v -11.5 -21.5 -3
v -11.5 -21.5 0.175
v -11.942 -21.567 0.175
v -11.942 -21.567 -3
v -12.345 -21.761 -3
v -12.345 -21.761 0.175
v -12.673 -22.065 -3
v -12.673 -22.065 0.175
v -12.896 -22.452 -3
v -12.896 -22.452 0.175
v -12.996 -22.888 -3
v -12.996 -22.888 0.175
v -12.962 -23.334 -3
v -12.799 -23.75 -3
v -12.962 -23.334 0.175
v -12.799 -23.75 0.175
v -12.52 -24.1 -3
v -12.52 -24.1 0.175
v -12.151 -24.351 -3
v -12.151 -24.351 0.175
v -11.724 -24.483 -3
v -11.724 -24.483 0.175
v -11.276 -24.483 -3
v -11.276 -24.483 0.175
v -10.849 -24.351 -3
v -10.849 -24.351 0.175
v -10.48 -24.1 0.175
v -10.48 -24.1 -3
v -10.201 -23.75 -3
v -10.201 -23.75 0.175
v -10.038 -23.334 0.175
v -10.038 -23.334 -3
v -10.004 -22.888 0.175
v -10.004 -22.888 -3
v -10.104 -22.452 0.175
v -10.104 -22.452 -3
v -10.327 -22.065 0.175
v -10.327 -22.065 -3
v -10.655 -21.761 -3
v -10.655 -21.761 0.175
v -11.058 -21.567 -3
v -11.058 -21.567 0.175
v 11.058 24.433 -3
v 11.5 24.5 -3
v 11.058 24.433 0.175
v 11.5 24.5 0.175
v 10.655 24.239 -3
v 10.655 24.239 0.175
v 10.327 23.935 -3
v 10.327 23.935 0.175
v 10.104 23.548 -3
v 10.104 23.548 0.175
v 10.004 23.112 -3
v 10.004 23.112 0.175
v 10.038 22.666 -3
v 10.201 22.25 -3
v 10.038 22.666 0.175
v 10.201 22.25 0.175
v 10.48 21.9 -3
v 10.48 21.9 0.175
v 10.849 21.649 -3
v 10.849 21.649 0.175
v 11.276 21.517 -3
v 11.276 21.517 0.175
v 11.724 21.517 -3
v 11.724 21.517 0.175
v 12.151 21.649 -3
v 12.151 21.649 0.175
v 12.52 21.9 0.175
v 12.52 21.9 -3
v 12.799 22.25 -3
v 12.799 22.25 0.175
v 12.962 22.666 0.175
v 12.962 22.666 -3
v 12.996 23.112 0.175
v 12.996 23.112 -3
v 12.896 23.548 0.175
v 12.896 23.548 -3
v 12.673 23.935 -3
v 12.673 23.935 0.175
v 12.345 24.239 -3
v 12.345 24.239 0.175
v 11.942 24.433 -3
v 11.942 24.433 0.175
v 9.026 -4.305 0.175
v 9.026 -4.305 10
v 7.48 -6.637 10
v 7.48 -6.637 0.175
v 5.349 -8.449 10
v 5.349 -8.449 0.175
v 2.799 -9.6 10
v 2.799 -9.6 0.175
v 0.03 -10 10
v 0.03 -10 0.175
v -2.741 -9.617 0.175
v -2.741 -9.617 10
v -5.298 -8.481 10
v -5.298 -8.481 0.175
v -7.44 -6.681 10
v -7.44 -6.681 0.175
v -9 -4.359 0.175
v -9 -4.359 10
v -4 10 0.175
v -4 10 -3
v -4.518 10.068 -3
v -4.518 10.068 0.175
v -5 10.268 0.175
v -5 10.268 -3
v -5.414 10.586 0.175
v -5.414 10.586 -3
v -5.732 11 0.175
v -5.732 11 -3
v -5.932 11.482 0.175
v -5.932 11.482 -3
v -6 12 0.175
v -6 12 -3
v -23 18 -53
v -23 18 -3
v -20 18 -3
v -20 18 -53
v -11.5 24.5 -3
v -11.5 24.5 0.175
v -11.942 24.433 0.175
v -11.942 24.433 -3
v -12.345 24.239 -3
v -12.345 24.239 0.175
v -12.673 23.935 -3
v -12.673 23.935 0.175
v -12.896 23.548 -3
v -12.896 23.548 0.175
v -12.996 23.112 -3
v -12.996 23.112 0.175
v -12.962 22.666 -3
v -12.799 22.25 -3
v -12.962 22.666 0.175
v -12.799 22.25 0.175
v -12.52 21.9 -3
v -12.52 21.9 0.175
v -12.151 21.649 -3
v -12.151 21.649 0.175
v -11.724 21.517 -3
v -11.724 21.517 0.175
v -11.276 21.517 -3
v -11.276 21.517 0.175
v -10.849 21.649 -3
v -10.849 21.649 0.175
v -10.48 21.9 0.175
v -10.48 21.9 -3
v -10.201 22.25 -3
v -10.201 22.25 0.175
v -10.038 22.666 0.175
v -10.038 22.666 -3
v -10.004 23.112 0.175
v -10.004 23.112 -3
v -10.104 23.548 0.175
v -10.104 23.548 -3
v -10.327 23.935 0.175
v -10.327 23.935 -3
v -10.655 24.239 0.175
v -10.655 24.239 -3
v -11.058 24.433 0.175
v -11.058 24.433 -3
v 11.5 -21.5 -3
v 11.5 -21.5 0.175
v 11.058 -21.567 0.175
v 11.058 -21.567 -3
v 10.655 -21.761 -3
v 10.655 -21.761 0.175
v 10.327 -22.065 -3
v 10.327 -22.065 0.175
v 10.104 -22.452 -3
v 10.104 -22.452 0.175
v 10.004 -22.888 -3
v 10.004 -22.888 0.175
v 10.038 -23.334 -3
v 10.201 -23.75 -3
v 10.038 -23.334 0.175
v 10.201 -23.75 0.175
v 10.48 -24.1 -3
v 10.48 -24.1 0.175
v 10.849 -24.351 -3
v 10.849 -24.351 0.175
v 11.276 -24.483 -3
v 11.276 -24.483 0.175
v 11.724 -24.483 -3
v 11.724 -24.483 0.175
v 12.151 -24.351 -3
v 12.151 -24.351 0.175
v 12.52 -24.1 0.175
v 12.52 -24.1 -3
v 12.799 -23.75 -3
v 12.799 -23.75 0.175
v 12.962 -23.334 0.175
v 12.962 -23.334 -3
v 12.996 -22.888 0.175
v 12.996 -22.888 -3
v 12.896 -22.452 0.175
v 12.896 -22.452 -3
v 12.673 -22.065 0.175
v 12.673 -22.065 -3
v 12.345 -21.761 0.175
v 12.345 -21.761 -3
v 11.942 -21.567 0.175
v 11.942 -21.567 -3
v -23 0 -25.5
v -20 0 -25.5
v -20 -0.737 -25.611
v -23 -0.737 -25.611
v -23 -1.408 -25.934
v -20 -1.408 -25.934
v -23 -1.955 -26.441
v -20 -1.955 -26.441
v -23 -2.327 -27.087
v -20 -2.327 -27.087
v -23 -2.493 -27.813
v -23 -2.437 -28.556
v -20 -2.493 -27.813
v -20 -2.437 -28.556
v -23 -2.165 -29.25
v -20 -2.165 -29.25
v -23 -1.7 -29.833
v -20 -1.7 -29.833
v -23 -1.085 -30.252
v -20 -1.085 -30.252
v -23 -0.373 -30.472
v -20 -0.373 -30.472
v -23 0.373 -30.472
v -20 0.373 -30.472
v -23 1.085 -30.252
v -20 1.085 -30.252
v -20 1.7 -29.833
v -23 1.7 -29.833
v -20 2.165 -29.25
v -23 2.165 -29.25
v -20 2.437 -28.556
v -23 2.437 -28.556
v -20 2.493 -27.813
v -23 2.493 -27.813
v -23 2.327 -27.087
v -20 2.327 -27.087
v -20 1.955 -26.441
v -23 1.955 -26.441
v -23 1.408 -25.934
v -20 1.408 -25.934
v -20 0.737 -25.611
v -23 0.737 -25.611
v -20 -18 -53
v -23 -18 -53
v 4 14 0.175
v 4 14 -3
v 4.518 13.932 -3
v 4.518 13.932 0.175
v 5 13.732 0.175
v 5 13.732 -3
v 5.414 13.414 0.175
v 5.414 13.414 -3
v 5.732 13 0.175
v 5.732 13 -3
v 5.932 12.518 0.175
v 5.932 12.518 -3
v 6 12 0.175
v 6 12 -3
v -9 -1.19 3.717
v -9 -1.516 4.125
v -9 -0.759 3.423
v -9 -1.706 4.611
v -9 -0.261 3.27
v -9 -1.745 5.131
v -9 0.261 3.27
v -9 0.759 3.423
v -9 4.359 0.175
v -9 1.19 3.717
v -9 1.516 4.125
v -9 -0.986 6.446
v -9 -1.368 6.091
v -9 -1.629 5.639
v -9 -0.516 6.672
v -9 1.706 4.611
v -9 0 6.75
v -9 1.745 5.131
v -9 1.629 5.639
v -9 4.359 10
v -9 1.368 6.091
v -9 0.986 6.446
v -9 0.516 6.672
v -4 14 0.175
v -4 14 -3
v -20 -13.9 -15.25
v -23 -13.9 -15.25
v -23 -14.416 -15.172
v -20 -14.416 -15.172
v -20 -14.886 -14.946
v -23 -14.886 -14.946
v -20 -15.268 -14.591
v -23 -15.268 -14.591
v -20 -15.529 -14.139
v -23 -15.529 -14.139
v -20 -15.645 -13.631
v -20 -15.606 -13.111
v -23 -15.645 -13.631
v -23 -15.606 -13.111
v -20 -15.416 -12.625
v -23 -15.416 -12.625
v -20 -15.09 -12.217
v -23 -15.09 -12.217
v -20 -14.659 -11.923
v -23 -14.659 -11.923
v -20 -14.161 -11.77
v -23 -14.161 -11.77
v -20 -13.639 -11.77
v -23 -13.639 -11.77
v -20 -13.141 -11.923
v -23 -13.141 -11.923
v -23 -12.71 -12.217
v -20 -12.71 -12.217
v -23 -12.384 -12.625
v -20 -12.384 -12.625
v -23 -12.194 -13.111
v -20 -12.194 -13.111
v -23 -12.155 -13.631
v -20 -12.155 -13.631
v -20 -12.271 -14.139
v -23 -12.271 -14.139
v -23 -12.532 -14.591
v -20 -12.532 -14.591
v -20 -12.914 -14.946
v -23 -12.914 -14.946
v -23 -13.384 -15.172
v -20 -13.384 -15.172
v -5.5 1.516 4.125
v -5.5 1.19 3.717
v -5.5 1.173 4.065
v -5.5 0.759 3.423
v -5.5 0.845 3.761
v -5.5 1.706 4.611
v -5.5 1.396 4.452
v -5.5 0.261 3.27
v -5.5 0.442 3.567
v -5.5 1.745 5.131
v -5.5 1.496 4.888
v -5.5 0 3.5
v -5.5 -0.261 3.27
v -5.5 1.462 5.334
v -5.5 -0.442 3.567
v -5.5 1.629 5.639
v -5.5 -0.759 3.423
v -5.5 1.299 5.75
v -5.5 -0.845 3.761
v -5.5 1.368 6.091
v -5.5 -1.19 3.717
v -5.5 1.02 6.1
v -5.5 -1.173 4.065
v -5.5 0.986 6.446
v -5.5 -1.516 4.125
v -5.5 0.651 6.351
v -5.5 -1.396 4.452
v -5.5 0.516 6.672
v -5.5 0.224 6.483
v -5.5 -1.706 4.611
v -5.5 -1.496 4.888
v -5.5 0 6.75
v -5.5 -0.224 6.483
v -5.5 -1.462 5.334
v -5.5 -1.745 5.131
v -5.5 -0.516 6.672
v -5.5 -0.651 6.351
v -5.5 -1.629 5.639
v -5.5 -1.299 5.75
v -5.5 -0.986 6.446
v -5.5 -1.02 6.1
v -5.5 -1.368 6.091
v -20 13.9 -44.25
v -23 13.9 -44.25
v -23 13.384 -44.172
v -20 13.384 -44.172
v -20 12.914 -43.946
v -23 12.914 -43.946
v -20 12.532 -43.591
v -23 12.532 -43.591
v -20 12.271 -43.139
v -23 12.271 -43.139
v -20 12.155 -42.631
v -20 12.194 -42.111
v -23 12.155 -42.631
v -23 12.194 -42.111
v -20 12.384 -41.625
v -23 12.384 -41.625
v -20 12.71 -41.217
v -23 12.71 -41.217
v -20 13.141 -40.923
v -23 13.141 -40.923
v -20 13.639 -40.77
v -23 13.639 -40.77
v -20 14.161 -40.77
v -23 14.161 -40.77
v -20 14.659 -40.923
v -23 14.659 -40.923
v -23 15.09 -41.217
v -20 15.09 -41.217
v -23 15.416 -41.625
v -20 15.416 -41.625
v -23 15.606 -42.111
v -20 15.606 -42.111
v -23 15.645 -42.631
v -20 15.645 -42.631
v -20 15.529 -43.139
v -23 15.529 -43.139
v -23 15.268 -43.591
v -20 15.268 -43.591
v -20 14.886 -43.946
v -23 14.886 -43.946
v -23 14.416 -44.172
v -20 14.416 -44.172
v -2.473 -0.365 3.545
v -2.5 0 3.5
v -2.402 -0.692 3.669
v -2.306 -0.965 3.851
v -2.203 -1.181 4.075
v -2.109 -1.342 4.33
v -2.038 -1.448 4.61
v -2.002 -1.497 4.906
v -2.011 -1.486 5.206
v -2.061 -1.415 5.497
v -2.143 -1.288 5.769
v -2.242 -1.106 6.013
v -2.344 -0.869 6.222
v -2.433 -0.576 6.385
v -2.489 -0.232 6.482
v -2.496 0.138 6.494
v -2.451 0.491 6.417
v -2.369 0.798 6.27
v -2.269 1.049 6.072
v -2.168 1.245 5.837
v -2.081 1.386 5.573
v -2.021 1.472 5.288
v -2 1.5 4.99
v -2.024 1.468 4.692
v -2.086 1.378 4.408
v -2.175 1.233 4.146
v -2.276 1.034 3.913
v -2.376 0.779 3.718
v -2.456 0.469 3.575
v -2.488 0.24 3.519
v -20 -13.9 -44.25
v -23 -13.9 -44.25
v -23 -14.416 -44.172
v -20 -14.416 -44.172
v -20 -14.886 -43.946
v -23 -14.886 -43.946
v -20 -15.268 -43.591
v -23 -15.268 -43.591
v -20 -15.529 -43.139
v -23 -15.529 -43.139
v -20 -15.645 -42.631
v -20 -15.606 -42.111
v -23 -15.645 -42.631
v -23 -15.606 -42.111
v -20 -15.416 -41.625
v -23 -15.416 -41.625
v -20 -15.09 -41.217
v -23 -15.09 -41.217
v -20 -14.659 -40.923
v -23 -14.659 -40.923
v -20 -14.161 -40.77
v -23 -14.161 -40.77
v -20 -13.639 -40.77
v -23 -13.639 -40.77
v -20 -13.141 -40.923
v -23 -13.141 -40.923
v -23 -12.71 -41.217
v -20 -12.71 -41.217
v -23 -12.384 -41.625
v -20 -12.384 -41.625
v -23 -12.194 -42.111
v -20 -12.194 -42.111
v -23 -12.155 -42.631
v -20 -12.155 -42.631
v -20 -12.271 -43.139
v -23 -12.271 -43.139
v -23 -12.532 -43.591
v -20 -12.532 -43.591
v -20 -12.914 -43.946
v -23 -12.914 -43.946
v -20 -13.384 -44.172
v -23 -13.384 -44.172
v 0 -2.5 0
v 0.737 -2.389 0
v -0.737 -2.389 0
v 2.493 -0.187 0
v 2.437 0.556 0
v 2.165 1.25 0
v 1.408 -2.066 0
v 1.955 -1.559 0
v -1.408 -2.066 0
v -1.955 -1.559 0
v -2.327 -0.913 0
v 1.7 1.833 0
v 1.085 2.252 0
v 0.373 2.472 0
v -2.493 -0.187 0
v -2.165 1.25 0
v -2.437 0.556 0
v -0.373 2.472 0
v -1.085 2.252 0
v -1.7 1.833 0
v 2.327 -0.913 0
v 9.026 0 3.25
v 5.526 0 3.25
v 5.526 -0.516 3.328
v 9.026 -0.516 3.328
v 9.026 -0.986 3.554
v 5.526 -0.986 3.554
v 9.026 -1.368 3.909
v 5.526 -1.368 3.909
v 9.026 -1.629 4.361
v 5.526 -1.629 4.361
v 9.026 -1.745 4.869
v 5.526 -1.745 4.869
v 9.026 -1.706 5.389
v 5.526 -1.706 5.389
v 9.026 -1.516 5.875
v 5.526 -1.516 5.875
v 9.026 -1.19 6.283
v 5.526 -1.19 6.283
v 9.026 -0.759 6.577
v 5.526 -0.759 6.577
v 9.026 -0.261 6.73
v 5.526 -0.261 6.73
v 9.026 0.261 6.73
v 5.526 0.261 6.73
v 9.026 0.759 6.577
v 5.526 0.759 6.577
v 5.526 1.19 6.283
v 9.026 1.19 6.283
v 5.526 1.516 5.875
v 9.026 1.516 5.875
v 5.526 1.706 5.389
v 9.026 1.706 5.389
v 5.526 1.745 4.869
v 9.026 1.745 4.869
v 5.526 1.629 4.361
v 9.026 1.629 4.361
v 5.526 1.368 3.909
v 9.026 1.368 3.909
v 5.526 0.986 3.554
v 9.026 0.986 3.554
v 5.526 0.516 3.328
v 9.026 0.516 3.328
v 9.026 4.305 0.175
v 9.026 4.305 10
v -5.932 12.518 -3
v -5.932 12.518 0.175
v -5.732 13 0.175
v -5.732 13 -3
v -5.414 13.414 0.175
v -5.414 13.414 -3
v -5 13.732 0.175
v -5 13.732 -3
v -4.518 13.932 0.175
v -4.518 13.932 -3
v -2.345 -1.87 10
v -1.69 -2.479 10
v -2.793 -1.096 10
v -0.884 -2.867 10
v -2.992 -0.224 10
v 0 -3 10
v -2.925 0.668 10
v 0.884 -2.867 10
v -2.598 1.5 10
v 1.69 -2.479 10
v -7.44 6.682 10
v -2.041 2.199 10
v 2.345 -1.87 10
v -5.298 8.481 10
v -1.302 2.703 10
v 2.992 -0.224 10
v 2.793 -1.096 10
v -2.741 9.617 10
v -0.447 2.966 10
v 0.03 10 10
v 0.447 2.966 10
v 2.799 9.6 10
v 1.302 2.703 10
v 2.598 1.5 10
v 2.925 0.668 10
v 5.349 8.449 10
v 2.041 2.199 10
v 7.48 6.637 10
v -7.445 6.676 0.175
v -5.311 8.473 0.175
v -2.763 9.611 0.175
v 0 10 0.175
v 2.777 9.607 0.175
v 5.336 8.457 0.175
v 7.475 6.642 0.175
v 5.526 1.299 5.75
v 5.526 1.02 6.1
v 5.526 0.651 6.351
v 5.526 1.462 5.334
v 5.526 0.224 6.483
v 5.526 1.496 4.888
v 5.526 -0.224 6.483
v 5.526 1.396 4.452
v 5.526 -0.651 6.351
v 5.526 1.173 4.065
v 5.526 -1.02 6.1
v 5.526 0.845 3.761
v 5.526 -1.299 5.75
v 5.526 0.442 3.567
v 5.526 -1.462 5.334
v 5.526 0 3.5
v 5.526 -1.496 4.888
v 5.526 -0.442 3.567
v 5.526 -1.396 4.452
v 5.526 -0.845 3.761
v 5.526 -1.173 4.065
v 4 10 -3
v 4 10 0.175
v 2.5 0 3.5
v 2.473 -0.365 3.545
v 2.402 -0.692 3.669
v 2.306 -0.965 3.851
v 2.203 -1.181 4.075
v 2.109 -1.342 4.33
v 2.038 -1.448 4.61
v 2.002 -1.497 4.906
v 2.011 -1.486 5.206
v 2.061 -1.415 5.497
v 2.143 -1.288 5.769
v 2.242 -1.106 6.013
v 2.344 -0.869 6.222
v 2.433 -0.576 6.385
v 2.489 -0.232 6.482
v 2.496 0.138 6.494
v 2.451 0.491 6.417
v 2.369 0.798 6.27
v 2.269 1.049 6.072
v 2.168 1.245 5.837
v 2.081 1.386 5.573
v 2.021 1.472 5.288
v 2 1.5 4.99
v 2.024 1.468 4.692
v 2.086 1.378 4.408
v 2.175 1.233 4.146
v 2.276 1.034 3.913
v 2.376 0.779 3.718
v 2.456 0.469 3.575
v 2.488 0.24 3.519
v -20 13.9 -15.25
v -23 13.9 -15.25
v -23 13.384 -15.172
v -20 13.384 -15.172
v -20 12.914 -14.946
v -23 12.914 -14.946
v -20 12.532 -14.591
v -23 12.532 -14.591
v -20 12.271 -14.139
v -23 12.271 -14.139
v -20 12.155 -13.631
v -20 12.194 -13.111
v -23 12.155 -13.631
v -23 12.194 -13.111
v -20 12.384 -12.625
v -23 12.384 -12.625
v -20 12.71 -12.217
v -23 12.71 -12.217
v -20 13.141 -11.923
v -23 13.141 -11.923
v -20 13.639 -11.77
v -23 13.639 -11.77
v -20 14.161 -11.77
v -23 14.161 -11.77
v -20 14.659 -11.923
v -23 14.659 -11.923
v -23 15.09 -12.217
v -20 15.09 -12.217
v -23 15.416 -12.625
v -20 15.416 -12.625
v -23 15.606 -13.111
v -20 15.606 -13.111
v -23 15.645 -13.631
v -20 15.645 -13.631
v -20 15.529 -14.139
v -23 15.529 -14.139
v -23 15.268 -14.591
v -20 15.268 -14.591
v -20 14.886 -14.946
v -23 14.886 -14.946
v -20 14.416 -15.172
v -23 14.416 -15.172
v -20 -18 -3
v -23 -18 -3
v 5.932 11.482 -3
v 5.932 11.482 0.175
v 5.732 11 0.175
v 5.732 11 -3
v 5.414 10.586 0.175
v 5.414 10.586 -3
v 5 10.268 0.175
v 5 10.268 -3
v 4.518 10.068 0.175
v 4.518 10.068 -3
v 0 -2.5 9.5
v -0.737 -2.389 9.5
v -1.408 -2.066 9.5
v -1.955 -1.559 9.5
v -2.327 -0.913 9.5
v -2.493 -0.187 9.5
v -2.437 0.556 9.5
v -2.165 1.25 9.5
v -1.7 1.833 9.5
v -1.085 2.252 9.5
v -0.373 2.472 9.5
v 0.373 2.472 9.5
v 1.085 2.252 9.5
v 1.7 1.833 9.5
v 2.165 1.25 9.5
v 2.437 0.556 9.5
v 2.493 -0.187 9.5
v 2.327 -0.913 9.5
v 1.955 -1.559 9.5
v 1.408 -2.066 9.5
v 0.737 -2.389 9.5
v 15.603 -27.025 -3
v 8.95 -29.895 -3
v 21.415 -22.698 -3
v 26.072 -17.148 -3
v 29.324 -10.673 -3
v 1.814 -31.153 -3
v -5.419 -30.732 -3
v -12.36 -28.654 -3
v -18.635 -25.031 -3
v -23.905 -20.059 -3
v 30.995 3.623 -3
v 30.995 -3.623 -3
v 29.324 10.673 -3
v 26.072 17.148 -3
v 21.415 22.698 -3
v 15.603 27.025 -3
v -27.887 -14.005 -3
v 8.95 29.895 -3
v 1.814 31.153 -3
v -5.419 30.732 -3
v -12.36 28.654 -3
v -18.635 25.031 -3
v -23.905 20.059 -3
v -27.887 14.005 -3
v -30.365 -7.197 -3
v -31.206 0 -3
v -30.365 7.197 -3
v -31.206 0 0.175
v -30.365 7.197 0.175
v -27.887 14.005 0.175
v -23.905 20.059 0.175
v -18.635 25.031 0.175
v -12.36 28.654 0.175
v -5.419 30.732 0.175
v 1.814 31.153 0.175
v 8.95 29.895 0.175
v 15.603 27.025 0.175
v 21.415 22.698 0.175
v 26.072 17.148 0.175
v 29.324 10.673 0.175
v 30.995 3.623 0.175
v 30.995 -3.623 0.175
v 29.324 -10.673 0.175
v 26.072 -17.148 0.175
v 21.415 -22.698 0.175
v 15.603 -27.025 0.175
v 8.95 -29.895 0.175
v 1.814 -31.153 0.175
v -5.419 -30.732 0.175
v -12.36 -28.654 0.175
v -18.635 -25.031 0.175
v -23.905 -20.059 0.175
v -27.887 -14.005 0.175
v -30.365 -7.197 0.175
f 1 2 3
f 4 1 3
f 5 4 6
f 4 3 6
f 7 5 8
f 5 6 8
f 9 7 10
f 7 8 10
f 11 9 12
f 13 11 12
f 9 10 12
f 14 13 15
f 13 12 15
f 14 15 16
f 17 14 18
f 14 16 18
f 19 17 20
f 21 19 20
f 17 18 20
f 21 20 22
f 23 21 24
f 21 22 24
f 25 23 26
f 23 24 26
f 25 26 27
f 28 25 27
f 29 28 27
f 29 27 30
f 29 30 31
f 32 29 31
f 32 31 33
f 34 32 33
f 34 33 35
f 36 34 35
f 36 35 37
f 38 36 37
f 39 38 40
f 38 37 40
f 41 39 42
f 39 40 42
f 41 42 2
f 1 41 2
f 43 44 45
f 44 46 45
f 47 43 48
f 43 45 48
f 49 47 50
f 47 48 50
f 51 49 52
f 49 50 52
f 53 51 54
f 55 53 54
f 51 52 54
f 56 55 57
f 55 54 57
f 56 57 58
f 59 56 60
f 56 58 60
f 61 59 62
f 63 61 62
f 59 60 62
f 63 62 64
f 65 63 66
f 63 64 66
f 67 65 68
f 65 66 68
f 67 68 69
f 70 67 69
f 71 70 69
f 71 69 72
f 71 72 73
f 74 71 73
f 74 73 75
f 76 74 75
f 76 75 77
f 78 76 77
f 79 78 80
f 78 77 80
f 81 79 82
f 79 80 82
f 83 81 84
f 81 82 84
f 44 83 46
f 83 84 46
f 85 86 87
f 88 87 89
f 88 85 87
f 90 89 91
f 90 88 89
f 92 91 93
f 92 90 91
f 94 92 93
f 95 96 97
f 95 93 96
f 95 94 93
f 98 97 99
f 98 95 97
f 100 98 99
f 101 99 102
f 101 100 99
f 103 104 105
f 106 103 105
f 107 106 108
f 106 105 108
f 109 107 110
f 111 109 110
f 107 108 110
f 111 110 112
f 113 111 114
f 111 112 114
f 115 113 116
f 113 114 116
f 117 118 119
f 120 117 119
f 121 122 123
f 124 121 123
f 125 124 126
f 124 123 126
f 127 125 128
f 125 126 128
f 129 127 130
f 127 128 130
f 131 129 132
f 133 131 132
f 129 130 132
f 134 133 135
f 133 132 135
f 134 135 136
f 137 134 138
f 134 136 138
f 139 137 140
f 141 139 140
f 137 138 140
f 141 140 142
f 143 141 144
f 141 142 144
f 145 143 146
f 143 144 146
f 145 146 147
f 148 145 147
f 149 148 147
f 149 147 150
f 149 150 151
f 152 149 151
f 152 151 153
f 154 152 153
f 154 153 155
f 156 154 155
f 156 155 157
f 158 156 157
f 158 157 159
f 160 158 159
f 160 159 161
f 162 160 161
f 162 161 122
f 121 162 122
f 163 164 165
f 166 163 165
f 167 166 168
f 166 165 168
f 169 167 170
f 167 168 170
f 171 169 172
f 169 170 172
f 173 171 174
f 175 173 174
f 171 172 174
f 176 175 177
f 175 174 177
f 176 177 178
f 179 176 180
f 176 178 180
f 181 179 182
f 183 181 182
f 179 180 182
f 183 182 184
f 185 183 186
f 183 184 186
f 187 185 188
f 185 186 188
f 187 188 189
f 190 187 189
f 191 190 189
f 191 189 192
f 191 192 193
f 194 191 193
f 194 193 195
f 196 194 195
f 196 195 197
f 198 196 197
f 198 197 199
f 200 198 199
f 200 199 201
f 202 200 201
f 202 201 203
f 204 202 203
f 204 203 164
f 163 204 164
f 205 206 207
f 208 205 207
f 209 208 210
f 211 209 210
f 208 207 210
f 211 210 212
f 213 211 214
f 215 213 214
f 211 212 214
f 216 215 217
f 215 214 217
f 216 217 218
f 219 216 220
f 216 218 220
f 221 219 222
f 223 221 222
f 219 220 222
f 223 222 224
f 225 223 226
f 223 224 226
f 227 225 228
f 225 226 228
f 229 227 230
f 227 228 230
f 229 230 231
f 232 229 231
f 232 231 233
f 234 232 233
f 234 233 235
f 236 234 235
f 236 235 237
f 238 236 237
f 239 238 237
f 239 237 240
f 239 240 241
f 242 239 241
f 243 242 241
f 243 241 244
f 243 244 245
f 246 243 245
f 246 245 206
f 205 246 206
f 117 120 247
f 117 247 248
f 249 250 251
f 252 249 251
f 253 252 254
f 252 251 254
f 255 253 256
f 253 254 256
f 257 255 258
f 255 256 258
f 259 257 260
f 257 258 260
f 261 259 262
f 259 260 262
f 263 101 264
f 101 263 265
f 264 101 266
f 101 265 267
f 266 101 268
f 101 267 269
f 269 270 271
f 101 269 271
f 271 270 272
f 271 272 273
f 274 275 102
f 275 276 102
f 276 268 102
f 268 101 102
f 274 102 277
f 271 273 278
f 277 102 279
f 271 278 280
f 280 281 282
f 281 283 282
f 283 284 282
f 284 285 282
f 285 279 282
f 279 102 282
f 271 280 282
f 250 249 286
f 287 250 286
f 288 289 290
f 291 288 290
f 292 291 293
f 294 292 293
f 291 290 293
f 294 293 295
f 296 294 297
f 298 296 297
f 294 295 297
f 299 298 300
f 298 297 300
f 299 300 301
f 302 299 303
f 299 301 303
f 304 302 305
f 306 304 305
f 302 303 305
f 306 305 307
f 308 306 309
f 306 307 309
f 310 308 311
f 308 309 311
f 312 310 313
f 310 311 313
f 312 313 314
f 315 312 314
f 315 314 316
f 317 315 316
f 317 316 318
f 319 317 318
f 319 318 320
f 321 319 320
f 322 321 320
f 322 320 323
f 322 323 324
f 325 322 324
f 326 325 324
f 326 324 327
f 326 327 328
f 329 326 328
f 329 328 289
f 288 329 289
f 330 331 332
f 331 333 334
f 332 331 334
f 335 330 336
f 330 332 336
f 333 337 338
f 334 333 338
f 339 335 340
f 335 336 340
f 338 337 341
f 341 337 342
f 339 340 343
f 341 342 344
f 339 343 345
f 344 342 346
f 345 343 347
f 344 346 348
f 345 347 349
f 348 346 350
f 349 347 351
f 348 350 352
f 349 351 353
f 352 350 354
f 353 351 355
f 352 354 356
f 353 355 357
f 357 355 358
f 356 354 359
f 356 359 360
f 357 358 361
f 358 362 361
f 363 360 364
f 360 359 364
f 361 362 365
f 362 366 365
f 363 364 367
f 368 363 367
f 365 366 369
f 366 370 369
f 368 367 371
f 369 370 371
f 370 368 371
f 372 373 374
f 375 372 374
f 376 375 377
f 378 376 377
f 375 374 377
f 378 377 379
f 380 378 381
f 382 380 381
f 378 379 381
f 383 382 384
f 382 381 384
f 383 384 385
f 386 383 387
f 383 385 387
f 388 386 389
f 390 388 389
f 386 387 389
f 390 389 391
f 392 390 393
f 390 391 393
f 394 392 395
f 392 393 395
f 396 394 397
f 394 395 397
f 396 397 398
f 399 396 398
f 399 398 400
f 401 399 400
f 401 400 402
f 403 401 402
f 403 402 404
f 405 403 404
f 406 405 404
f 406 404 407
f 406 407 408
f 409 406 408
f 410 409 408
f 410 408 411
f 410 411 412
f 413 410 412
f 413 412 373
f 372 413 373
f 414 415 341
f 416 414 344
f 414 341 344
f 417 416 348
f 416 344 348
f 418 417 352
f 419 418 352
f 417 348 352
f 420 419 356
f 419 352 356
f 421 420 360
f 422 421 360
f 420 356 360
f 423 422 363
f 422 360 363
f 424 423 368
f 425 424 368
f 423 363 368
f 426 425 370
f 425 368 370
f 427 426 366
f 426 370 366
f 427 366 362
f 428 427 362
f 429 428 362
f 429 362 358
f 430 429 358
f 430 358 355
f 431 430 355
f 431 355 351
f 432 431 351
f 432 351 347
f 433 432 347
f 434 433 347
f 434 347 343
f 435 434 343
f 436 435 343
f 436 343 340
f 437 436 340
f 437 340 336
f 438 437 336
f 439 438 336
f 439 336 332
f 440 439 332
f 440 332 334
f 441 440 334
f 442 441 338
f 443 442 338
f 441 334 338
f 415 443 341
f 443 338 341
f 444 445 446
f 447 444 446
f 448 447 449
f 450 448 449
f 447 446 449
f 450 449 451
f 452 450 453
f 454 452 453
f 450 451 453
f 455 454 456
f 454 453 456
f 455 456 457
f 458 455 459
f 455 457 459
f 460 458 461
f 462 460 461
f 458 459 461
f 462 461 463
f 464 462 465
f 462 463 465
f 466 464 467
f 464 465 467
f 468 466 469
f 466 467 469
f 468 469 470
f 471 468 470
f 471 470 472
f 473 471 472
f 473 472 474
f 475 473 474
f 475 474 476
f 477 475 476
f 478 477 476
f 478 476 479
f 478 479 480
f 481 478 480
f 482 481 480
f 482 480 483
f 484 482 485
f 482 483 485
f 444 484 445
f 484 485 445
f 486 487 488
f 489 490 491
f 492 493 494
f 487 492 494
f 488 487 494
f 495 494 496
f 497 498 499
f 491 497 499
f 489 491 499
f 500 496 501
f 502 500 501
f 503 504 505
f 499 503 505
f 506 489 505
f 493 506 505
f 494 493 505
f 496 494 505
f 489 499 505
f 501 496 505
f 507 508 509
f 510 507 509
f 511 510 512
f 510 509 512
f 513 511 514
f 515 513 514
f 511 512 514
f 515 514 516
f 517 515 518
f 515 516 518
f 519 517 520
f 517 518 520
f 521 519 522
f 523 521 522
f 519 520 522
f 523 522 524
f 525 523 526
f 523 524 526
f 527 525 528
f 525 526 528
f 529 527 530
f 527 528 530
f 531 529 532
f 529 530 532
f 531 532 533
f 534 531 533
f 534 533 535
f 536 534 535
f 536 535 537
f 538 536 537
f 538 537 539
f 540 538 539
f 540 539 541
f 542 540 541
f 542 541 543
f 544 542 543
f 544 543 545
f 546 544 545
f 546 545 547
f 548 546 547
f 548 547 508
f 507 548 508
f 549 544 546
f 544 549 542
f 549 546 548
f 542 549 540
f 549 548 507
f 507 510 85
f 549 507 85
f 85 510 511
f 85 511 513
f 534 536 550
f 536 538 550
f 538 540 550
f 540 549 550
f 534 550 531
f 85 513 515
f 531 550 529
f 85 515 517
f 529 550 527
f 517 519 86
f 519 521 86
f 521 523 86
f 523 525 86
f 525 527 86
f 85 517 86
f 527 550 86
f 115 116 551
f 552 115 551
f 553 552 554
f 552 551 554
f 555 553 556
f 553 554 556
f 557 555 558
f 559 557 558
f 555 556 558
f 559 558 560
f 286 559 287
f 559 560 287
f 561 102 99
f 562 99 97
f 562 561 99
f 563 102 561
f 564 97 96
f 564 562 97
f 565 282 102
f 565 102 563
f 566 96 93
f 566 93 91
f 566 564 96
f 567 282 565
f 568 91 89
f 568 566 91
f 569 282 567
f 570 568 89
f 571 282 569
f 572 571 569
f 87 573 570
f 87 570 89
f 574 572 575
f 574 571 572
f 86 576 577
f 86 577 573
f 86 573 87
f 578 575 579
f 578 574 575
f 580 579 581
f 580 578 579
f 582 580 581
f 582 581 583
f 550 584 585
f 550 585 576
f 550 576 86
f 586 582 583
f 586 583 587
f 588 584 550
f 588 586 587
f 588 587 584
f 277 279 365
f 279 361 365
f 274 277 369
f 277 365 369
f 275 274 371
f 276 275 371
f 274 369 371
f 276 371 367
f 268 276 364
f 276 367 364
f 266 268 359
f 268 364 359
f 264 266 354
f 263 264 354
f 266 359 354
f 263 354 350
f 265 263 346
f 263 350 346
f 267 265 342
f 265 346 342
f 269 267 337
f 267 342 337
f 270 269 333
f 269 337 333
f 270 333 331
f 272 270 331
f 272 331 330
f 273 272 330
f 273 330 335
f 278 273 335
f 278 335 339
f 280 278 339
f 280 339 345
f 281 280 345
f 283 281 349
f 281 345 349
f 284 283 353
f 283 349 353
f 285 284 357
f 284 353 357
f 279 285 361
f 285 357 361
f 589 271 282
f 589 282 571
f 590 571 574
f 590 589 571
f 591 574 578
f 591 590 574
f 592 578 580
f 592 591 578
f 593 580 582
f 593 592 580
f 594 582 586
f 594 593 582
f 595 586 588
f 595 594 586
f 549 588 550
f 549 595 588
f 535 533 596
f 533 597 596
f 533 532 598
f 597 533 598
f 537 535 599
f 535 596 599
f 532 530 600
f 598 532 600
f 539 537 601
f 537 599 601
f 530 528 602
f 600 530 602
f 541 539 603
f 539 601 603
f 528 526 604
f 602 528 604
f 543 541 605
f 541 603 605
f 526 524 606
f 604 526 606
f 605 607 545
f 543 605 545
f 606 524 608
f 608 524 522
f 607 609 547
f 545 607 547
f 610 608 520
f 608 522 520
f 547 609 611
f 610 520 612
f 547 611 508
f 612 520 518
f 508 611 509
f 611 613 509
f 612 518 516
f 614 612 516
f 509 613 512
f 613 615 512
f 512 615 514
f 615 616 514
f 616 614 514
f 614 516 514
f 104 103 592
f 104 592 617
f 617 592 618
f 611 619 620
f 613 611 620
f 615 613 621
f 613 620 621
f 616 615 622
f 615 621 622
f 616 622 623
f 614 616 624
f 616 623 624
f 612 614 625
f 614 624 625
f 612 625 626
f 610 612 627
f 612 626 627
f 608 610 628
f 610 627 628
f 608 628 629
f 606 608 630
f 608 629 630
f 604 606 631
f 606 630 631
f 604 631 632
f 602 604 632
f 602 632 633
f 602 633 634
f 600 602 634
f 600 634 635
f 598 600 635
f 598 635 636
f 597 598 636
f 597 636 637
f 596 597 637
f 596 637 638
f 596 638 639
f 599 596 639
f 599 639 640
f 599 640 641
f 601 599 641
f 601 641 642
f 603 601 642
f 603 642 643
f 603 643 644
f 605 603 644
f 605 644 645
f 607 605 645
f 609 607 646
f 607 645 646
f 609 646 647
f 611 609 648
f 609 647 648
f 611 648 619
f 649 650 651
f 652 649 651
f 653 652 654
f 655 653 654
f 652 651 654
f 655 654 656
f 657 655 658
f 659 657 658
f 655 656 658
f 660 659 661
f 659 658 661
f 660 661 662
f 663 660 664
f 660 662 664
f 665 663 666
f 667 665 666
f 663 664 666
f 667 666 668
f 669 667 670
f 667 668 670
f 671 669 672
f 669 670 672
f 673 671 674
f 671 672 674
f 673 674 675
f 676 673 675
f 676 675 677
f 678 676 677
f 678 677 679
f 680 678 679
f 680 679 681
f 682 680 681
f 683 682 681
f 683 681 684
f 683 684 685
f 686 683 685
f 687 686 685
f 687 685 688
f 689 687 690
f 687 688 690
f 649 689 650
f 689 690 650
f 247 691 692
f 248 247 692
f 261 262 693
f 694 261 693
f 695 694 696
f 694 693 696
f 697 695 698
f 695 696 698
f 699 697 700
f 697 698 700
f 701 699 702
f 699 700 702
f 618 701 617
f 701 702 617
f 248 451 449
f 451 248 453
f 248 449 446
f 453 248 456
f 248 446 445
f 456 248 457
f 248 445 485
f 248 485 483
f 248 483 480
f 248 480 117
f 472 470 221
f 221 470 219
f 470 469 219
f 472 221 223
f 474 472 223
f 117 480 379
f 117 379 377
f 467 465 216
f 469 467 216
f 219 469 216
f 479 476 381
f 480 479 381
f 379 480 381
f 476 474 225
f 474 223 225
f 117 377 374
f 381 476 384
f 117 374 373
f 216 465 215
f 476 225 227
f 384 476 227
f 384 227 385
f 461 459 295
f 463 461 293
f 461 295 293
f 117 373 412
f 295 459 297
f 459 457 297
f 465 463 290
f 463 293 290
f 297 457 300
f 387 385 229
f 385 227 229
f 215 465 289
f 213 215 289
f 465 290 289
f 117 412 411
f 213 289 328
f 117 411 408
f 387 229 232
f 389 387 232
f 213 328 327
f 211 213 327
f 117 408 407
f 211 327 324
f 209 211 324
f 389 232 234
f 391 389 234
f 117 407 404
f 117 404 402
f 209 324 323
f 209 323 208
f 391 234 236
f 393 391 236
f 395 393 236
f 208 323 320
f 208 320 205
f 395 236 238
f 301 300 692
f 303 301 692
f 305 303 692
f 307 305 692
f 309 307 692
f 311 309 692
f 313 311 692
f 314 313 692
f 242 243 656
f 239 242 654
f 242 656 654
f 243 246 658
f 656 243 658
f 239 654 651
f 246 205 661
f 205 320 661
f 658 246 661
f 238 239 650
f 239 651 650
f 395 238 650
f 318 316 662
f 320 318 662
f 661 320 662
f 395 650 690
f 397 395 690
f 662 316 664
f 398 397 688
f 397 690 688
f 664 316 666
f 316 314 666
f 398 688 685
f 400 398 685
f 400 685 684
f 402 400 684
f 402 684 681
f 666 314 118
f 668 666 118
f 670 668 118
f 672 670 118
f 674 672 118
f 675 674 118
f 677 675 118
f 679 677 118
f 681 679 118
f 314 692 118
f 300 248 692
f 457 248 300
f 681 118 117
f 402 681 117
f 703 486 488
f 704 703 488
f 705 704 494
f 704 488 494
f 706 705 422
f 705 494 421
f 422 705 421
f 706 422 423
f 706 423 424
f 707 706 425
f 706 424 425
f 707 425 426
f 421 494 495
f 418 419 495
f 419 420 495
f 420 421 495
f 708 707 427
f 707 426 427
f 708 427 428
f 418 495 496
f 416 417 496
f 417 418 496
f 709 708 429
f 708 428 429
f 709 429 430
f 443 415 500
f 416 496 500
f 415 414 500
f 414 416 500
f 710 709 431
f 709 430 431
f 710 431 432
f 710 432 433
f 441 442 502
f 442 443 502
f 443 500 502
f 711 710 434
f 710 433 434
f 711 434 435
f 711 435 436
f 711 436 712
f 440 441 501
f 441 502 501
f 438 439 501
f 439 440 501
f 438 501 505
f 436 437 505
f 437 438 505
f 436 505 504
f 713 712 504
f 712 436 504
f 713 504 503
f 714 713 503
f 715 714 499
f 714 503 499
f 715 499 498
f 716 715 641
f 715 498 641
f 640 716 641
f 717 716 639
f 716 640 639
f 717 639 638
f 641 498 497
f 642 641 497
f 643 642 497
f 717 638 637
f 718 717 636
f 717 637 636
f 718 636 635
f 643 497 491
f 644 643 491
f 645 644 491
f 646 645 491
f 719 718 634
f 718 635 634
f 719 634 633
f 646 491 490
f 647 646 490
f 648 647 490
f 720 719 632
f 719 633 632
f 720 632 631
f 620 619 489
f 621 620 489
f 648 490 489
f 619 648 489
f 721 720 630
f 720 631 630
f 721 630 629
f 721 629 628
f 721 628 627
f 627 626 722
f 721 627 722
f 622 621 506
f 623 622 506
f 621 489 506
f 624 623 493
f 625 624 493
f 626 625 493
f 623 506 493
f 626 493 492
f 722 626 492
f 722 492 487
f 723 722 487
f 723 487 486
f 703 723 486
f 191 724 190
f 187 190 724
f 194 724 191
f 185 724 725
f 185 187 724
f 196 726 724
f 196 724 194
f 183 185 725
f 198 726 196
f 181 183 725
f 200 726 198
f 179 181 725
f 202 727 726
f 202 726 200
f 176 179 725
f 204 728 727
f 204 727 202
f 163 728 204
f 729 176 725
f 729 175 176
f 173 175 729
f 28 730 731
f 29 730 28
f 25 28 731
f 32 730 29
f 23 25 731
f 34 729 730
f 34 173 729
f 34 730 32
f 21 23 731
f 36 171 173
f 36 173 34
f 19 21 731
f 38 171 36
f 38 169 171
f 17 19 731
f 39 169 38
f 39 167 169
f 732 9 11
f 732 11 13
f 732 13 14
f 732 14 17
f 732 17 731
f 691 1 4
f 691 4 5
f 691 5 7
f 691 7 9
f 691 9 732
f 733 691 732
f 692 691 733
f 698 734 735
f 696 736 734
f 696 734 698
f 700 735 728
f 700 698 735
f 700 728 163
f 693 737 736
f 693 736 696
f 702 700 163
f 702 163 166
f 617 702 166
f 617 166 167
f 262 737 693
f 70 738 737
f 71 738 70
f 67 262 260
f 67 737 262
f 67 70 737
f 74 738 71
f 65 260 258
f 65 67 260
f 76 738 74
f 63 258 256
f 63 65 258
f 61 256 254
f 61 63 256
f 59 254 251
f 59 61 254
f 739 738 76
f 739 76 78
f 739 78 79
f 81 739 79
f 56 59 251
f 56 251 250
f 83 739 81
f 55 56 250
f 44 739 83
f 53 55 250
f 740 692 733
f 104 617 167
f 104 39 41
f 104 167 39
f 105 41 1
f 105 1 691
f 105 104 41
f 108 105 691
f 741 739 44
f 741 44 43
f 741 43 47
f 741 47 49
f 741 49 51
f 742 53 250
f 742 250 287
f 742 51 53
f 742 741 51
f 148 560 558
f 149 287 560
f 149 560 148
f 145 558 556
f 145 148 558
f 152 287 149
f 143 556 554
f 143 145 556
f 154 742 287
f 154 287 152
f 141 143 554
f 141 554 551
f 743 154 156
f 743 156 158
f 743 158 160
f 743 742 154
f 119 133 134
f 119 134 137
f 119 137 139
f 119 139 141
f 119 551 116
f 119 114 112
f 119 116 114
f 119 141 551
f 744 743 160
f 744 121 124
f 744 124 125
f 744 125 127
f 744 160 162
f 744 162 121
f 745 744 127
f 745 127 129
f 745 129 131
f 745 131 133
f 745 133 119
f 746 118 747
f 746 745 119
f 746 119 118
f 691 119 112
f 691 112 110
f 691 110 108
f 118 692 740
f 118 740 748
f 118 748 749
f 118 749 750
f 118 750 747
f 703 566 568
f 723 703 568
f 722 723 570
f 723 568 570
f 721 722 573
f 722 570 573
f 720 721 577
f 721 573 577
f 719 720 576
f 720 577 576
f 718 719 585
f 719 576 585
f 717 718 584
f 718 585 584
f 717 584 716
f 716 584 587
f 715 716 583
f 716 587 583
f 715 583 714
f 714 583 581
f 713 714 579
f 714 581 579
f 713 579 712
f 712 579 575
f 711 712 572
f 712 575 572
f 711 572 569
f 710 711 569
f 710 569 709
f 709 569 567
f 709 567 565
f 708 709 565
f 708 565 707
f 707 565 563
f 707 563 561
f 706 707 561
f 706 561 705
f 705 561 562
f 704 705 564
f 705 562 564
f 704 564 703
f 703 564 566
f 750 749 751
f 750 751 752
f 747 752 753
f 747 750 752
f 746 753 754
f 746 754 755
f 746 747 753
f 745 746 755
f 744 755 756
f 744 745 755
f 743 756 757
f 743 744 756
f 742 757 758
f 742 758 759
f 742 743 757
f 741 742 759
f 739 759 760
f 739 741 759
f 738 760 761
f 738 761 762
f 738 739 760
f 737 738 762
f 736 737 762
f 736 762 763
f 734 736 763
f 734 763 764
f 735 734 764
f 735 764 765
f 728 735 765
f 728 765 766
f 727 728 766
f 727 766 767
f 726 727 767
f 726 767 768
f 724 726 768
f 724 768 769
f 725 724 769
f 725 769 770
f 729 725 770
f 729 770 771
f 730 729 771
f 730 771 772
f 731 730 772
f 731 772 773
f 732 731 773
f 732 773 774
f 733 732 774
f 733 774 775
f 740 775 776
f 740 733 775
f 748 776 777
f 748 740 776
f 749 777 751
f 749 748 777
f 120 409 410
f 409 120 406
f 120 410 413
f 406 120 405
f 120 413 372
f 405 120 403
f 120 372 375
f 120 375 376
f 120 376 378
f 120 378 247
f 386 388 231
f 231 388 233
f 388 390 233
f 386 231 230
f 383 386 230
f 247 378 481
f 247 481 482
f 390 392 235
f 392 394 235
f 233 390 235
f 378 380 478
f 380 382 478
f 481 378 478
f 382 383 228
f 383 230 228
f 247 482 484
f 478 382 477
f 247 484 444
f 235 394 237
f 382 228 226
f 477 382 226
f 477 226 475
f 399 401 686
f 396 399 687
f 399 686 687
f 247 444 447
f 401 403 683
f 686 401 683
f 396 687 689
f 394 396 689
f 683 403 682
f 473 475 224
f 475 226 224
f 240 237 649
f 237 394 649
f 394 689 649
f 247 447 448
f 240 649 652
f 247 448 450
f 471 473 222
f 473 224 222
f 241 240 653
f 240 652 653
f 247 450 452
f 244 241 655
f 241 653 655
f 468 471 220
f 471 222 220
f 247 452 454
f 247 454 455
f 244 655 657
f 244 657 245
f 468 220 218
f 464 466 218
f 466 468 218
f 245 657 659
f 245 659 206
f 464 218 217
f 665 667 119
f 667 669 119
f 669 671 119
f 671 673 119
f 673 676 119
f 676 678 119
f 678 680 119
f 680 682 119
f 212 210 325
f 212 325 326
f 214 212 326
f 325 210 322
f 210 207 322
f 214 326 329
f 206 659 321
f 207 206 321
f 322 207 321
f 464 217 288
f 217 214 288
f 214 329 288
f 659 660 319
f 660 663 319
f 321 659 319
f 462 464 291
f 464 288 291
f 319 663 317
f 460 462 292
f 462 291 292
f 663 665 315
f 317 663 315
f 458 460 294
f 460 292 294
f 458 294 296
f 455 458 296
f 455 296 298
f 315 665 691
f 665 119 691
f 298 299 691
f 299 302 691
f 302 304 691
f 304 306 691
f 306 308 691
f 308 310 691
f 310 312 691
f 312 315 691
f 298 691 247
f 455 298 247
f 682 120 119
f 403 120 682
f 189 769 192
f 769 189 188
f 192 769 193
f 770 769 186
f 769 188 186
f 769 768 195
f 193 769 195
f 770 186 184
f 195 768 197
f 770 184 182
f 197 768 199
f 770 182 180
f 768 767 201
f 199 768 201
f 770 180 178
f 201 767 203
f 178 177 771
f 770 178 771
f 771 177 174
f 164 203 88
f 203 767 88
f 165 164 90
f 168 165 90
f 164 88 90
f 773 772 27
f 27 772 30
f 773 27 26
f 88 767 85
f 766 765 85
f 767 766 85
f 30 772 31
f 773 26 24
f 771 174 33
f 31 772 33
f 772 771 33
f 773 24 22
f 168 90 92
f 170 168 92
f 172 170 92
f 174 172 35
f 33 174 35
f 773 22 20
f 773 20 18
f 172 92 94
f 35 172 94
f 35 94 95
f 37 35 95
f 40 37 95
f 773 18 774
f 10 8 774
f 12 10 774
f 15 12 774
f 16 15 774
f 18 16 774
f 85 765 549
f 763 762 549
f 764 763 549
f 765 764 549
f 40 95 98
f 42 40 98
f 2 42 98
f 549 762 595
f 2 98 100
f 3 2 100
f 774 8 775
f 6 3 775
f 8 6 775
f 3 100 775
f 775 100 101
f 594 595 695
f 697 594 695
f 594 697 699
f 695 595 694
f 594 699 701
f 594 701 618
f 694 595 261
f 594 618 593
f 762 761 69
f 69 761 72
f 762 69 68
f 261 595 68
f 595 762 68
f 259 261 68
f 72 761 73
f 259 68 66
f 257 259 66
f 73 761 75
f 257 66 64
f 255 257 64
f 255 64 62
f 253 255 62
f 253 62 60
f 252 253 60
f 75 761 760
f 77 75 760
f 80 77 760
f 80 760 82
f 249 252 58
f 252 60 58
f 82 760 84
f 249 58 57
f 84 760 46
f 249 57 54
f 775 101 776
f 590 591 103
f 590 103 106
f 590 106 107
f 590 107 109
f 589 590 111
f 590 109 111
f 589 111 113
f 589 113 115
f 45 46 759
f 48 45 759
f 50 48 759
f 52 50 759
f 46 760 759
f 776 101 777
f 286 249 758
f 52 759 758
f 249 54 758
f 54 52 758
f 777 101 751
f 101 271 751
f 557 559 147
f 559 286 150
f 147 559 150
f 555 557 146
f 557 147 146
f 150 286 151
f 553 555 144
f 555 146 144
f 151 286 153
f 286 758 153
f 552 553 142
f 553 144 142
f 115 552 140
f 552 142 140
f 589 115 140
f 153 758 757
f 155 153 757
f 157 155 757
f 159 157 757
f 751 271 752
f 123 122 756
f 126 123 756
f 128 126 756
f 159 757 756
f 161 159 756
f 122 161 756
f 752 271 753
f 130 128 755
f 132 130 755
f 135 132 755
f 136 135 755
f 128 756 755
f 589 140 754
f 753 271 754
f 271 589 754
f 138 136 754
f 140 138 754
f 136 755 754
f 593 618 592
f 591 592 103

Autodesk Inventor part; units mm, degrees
ref_plane "YZ Plane" through (0, 0, 0) normal (1, 0, 0) x (0, 1, 0)
ref_plane "XZ Plane" through (0, 0, 0) normal (0, 1, 0) x (-1, 0, 0)
ref_plane "XY Plane" through (0, 0, 0) normal (0, 0, 1) x (1, 0, 0)
sketch "Sketch1" plane through (0, 0, 0) normal (0, 0, 1) x (1, 0, 0)
  circle A0 centre (0, 0) radius 10
  dimension "d0" = 20
extrude "Extrusion1" add sketch "Sketch1" along normal blind 10
sketch "Sketch2" plane through (0, 0, 10) normal (0, 0, 1) x (1, 0, 0)
  point P0 (0, 0)
  point P1 (0, 0)
hole "Hole1" at (0, 0, 10) direction (0, 0, -1) diameter 5 end through all
chamfer "Chamfer1" distance 0.5 angle 45 1 edges at (0, 2.5, 10)
sketch "Sketch3" plane through (0, 0, 10) normal (0, 0, 1) x (1, 0, 0)
  circle A0 centre (0, 0) radius 10 projected
  line L0 (-10, 0) -> (-9, 0)
  line L1 (-9, 0) -> (-9, 4.3589)
  line L2 (-9, 4.3589) -> (-10, 4.3589)
  line L3 (-10, 4.3589) -> (-10, 0)
  line L4 (-10, 0) -> (-9, 0)
  line L5 (-9, 0) -> (-9, -4.4002)
  line L6 (-9, -4.4002) -> (-10, -4.4002)
  line L7 (-10, -4.4002) -> (-10, 0)
  line L8 (10.026, 0) -> (9.026, 0)
  line L9 (9.026, 0) -> (9.026, 4.3589)
  line L10 (9.026, 4.3589) -> (10.026, 4.3589)
  line L11 (10.026, 4.3589) -> (10.026, 0)
  line L12 (10.026, 0) -> (9.026, 0)
  line L13 (9.026, 0) -> (9.026, -4.4002)
  line L14 (9.026, -4.4002) -> (10.026, -4.4002)
  line L15 (10.026, -4.4002) -> (10.026, 0)
  dimension "d13" = 1
  dimension "d14" = 1
  dimension "d15" = 1
extrude "Extrusion2" cut sketch "Sketch3" against normal blind 10 contours L1 L0 A0 | L0 L5 A0 | A0 L5 L6 L7 | L9 L10 L11 L8 A0 | A0 L8 L9 | L8 L15 L14 L13 A0 | A0 L13 L8
sketch "Sketch4" plane through (9.026, -4.3048, 10) normal (1, 0, 0) x (0, 0, -1)
  line L0 (10, 4.3048) -> (5, 4.3048)
  line L1 (0.5, 1.8048) -> (0.5, 6.8048) projected
  dimension "d18" = 5
hole "Hole2" at (9.026, 0, 5) direction (-1, 0, 0) diameter 3 end through all
sketch "Sketch5" plane through (9.026, -4.3048, 10) normal (1, 0, 0) x (0, 0, -1)
  circle A0 centre (5, 4.3048) radius 1.5 projected
  point P0 (10, 4.3048)
hole "Hole3" at (9.026, 0, 5) direction (-1, 0, 0) diameter 3.5 depth 3.5
sketch "Sketch6" plane through (-9, -4.3589, 10) normal (-1, 0, 0) x (0, 0, 1)
  circle A0 centre (-5, 4.3589) radius 1.5 projected
  point P0 (-10, 4.3589)
hole "Hole4" at (-9, 0, 5) direction (1, 0, 0) diameter 3.5 depth 3.5
sketch "Sketch7" plane through (0, 0, 0) normal (0, 0, -1) x (-1, 0, 0)
  line L0 (0, 0) -> (-9.026, 0)
  line L1 (-9.026, 0) -> (-9.026, 18)
  line L2 (-9.026, 18) -> (0, 18)
  line L3 (0, 18) -> (0, 0)
  line L4 (0, 0) -> (-9.026, 0)
  line L5 (-9.026, 0) -> (-9.026, -18)
  line L6 (-9.026, -18) -> (0, -18)
  line L7 (0, -18) -> (0, 0)
  line L8 (0, 18) -> (23, 18)
  line L9 (23, 18) -> (23, -18)
  line L10 (23, -18) -> (0, -18)
  line L11 (0, -18) -> (0, 18)
  dimension "d40" = 9.026
  dimension "d41" = 18
  dimension "d42" = 18
  dimension "d43" = 23
extrude "Extrusion3" add sketch "Sketch7" along normal blind 3
sketch "Sketch8" plane through (0, 0, -3) normal (0, 0, -1) x (-1, 0, 0)
  line L0 (23, 18) -> (-9.026, 18) projected
  line L1 (-9.026, -18) -> (23, -18) projected
  line L2 (23, 18) -> (20, 18)
  line L3 (20, 18) -> (20, -18)
  line L4 (20, -18) -> (23, -18)
  line L5 (23, -18) -> (23, 18)
  point P0 (0, 0)
  dimension "d46" = 3
extrude "Extrusion4" add sketch "Sketch8" along normal blind 50
sketch "Sketch9" plane through (-20, -18, -3) normal (1, 0, 0) x (0, 0, -1)
  line L0 (0, 0) -> (0, 36) projected
  line L1 (0, 36) -> (25, 36)
  line L2 (-3, 36) -> (50, 36) projected
  line L3 (25, 36) -> (25, 18)
  line L4 (-3, 0) -> (50, 0) projected
  line L5 (25, 18) -> (39.5, 18)
  line L6 (39.5, 18) -> (39.5, 31.9)
  line L7 (39.5, 31.9) -> (25, 31.9)
  line L8 (25, 31.9) -> (25, 18)
  line L9 (25, 18) -> (39.5, 18)
  line L10 (39.5, 18) -> (39.5, 4.1)
  line L11 (39.5, 4.1) -> (25, 4.1)
  line L12 (25, 4.1) -> (25, 18)
  line L13 (25, 18) -> (10.5, 18)
  line L14 (10.5, 18) -> (10.5, 31.9)
  line L15 (10.5, 31.9) -> (25, 31.9)
  line L16 (25, 31.9) -> (25, 18)
  line L17 (25, 18) -> (10.5, 18)
  line L18 (10.5, 18) -> (10.5, 4.1)
  line L19 (10.5, 4.1) -> (25, 4.1)
  line L20 (25, 4.1) -> (25, 18)
  point P0 (-3, 18)
  dimension "d49" = 25
  dimension "d50" = 18
  dimension "d51" = 14.5
  dimension "d52" = 13.9
  dimension "d53" = 13.9
  dimension "d54" = 14.5
hole "Hole5" at (-20, 13.9, -13.5) at (-20, 13.9, -42.5) at (-20, -13.9, -42.5) at (-20, -13.9, -13.5) direction (-1, 0, 0) diameter 3.5 end through all
sketch "Sketch10" plane through (0, 0, -3) normal (0, 0, -1) x (-1, 0, 0)
  line L0 (-9.026, -18) -> (23, -18) projected
  circle A0 centre (0, 0) radius 29.2062
  circle A1 centre (0, 0) radius 2.5 projected
  circle A2 centre (0, 0) radius 31.206
  dimension "d62" = 62.412
extrude "Extrusion5" add sketch "Sketch10" against normal blind 3.175 contours A0 | A2
sketch "Sketch11" plane through (0, 0, -3) normal (0, 0, -1) x (-1, 0, 0)
  line L0 (23, -18) -> (23, 18) projected
  circle A0 centre (0, 0) radius 29.2062
  line L1 (23, 18) -> (-23, 18)
  line L2 (-23, 18) -> (-23, -18)
  line L3 (-23, -18) -> (23, -18)
  line L4 (23, -18) -> (23, 18)
  circle A1 centre (0, 0) radius 2.5 projected
  line L5 (0, 0) -> (0, 23)
  line L6 (0, 23) -> (11.5, 23)
  line L7 (11.5, 23) -> (-11.5, 23)
  line L8 (-11.5, 23) -> (-11.5, -23)
  line L9 (-11.5, -23) -> (11.5, -23)
  line L10 (11.5, -23) -> (11.5, 23)
  dimension "d65" = 23
  dimension "d66" = 11.5
  dimension "d67" = 23
  dimension "d68" = 46
hole "Hole6" at (11.5, 23, -3) at (-11.5, 23, -3) at (11.5, -23, -3) at (-11.5, -23, -3) direction (0, 0, 1) diameter 3 depth 3.5
sketch "Sketch12" plane through (-20, -18, -3) normal (1, 0, 0) x (0, 0, -1)
  line L0 (0, 0) -> (0, 36) projected
  line L1 (50, 0) -> (50, 36) projected
  point P0 (-3, 18)
  point P1 (25, 18)
sketch "Sketch13" plane through (0, 0, 0.175) normal (0, 0, 1) x (1, 0, 0)
  arc A0 (9.026, 4.3048) -> (-9, 4.3589) centre (0, 0) ccw projected
  line L0 (0, 10) -> (6, 10)
  line L1 (6, 10) -> (6, 14)
  line L2 (6, 14) -> (0, 14)
  line L3 (0, 14) -> (0, 10)
  line L4 (6, 14) -> (-6, 14)
  line L5 (-6, 14) -> (-6, 10)
  line L6 (-6, 10) -> (6, 10)
  line L7 (6, 10) -> (6, 14)
  dimension "d76" = 6
  dimension "d77" = 4
  dimension "d78" = 12
extrude "Extrusion6" cut sketch "Sketch13" against normal blind 3.175
fillet "Fillet1" radius 2 4 edges at (-6, 14, -1.4125) (6, 14, -1.4125) (6, 10, -1.4125) (-6, 10, -1.4125)
sketch "Sketch14" plane through (-23, -18, -3) normal (-1, 0, 0) x (0, 0, 1)
  circle A0 centre (-39.5, 31.9) radius 1.75 projected
  circle A1 centre (-10.5, 4.1) radius 1.75 projected
  line L0 (-39.5, 31.9) -> (-10.5, 4.1)
  circle A2 centre (-39.5, 4.1) radius 1.75 projected
  line L1 (-10.5, 4.1) -> (-39.5, 4.1)
  circle A3 centre (-10.5, 31.9) radius 1.75 projected
  line L2 (-39.5, 4.1) -> (-10.5, 31.9)
  point P0 (3, 18)
  point P1 (-25, 18)
hole "Hole7" at (-23, 0, -28) direction (1, 0, 0) diameter 5 end through all
properties part number "LidarLiteV3Mount"
